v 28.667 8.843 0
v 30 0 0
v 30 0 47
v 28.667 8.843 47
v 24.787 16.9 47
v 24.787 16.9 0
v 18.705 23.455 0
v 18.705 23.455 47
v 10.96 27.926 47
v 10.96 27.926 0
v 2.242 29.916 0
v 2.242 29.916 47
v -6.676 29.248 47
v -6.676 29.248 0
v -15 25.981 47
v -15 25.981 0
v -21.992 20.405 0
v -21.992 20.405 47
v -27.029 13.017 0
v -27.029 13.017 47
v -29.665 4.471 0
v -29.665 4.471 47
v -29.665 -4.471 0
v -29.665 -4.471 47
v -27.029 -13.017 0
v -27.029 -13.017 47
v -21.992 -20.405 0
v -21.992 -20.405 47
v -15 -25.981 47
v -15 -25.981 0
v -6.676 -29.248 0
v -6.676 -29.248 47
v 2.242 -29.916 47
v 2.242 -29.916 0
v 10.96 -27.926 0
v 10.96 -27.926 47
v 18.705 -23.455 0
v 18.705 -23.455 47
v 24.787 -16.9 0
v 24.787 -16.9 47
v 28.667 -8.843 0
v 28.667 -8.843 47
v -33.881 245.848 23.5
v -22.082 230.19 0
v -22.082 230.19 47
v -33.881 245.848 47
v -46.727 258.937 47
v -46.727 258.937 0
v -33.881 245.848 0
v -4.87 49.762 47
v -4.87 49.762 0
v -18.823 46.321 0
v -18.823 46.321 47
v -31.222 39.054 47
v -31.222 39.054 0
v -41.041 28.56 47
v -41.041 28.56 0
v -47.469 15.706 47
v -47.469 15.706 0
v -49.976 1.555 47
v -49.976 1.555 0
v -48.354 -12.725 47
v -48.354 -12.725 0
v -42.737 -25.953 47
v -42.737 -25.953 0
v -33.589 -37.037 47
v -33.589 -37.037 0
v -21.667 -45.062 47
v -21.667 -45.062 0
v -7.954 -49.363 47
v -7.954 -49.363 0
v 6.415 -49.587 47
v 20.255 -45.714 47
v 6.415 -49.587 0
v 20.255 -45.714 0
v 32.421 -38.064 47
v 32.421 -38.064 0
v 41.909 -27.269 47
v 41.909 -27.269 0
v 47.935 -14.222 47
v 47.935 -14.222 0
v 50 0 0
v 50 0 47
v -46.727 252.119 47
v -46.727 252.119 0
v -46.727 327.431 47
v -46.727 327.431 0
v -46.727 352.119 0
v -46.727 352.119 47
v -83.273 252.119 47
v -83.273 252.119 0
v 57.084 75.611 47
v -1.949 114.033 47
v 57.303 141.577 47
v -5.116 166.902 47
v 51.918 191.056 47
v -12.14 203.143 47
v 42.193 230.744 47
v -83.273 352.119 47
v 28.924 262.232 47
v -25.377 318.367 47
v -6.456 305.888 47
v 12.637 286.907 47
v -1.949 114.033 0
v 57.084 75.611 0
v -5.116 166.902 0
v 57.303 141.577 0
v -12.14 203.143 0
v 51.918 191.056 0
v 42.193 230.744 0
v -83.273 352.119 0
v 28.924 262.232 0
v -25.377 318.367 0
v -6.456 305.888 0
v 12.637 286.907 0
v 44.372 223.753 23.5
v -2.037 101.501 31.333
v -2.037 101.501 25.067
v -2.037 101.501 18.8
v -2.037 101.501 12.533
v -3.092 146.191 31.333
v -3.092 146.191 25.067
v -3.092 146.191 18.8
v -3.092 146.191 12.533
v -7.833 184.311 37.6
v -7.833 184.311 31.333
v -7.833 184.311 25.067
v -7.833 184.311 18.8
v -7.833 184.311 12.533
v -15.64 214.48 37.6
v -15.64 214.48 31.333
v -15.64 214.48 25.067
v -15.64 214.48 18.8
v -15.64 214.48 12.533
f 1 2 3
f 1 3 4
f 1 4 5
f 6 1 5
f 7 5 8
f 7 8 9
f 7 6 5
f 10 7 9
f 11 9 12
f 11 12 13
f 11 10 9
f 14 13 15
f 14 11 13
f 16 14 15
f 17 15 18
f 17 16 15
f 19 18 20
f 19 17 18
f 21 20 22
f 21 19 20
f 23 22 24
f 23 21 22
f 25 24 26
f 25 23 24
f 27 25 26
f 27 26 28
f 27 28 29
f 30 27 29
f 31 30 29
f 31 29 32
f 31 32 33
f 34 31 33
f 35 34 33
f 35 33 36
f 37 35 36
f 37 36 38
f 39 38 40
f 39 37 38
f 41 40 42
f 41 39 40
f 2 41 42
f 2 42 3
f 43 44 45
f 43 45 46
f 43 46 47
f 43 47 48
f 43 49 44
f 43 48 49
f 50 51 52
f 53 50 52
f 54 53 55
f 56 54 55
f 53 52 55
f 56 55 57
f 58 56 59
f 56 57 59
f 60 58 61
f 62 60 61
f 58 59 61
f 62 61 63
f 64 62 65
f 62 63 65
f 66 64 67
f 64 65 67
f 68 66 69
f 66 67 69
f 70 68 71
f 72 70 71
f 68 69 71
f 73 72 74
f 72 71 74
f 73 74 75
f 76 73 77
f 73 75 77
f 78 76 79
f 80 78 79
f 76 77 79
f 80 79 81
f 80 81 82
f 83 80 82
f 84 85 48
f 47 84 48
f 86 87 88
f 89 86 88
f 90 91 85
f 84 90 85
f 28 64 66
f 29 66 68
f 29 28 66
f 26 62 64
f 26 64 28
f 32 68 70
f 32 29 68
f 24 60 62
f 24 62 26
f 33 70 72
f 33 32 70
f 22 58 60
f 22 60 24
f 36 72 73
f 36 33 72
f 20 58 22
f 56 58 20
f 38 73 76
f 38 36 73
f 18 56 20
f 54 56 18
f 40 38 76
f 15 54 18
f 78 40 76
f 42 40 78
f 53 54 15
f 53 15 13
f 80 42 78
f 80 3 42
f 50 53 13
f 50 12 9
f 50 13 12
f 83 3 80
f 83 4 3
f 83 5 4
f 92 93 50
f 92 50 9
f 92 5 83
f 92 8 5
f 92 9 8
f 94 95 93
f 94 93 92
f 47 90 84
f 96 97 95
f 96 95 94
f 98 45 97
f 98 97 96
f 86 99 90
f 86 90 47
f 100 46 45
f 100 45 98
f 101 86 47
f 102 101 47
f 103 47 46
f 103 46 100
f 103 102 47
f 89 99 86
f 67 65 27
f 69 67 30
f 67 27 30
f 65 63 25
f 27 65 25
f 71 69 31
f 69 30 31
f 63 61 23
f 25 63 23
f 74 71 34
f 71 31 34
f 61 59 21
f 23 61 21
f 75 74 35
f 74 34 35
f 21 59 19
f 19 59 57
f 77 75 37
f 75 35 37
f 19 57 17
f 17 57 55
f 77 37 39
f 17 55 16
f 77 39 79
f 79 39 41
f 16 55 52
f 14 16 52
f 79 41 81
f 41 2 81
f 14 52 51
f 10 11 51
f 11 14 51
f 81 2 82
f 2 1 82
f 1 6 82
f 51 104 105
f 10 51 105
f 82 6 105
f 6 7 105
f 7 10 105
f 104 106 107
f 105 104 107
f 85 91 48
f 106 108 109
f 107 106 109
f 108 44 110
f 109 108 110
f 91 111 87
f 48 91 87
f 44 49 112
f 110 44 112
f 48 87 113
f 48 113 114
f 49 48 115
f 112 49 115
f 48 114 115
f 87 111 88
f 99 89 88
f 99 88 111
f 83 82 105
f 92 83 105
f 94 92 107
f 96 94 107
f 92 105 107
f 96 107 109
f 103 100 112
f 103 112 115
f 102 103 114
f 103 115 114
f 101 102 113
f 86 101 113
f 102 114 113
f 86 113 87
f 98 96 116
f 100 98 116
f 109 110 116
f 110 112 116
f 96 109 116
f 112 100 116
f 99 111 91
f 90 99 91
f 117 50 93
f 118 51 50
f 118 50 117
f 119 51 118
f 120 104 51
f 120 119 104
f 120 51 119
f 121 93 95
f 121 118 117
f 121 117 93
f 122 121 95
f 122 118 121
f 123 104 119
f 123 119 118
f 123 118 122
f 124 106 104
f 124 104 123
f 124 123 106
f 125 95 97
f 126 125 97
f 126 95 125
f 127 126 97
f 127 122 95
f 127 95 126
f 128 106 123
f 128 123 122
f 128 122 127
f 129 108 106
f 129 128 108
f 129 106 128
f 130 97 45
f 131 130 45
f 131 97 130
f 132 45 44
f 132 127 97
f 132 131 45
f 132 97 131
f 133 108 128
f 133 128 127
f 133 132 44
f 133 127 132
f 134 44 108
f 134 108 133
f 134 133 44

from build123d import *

# Parameters (mm, degrees)
SKETCH1_R           = 50
SKETCH1_R_2         = 30
BOSS_EXTRUDE1_DEPTH = 47


with BuildPart() as part:
    # Sketch1 → Boss-Extrude1 (new body)
    with BuildSketch(Plane.XY):
        with BuildLine():
            Line((-46.727102691, 252.119188355), (-46.727102691, 258.937140002))
            add(Edge.make_bspline(
                [(-22.082294652, 230.189836254), (-33.358154649, 247.131709382), (-46.727102689, 258.937140004)],
                knots=[0, 0, 0, 0.202133658, 0.202133658, 0.202133658], degree=2))
            add(Edge.make_bspline(
                [(-4.870036741, 49.762262229), (-4.393775013, 55.181886992), (-3.493820314, 66.662022051), (-2.529366378, 83.59139057), (-1.982320476, 100.516724073), (-1.858789362, 121.992140621), (-2.814978943, 146.760764163), (-5.156886221, 168.679611703), (-7.775671314, 184.458623381), (-10.08390129, 195.406366158), (-12.704291898, 205.462363583), (-15.117675621, 213.09980662), (-17.165967371, 218.768249548), (-18.756253721, 222.802063426), (-20.120456476, 225.981036836), (-21.236527654, 228.424580455), (-21.795733048, 229.59981685), (-22.082294652, 230.189836254)],
                knots=[0.06256779, 0.06256779, 0.06256779, 0.06256779, 0.087876155, 0.117168207, 0.146460259, 0.17575231, 0.234336414, 0.292920517, 0.322212569, 0.35150462, 0.380796672, 0.410088724, 0.42473475, 0.439380776, 0.454026801, 0.461349814, 0.468672827, 0.468672827, 0.468672827, 0.468672827], degree=3))
            ThreePointArc((-4.870036741, 49.762262229), (33.589419189, 37.037155918), (50, 0))
            add(Edge.make_bspline(
                [(50, 0), (87.107306859, 283.791217757), (-46.727102691, 327.431264092)],
                knots=[0, 0, 0, 0.770439733, 0.770439733, 0.770439733], degree=2))
            Line((-46.727102691, 327.431264091), (-46.727102691, 352.119188355))
            Line((-46.727102691, 352.119188355), (-83.272897309, 352.119188355))
            Line((-83.272897309, 352.119188355), (-83.272897309, 252.119188355))
            Line((-83.272897309, 252.119188355), (-46.727102691, 252.119188355))
        make_face()
        Circle(SKETCH1_R)
        Circle(SKETCH1_R_2, mode=Mode.SUBTRACT)
    extrude(amount=BOSS_EXTRUDE1_DEPTH)


solid = part.part
